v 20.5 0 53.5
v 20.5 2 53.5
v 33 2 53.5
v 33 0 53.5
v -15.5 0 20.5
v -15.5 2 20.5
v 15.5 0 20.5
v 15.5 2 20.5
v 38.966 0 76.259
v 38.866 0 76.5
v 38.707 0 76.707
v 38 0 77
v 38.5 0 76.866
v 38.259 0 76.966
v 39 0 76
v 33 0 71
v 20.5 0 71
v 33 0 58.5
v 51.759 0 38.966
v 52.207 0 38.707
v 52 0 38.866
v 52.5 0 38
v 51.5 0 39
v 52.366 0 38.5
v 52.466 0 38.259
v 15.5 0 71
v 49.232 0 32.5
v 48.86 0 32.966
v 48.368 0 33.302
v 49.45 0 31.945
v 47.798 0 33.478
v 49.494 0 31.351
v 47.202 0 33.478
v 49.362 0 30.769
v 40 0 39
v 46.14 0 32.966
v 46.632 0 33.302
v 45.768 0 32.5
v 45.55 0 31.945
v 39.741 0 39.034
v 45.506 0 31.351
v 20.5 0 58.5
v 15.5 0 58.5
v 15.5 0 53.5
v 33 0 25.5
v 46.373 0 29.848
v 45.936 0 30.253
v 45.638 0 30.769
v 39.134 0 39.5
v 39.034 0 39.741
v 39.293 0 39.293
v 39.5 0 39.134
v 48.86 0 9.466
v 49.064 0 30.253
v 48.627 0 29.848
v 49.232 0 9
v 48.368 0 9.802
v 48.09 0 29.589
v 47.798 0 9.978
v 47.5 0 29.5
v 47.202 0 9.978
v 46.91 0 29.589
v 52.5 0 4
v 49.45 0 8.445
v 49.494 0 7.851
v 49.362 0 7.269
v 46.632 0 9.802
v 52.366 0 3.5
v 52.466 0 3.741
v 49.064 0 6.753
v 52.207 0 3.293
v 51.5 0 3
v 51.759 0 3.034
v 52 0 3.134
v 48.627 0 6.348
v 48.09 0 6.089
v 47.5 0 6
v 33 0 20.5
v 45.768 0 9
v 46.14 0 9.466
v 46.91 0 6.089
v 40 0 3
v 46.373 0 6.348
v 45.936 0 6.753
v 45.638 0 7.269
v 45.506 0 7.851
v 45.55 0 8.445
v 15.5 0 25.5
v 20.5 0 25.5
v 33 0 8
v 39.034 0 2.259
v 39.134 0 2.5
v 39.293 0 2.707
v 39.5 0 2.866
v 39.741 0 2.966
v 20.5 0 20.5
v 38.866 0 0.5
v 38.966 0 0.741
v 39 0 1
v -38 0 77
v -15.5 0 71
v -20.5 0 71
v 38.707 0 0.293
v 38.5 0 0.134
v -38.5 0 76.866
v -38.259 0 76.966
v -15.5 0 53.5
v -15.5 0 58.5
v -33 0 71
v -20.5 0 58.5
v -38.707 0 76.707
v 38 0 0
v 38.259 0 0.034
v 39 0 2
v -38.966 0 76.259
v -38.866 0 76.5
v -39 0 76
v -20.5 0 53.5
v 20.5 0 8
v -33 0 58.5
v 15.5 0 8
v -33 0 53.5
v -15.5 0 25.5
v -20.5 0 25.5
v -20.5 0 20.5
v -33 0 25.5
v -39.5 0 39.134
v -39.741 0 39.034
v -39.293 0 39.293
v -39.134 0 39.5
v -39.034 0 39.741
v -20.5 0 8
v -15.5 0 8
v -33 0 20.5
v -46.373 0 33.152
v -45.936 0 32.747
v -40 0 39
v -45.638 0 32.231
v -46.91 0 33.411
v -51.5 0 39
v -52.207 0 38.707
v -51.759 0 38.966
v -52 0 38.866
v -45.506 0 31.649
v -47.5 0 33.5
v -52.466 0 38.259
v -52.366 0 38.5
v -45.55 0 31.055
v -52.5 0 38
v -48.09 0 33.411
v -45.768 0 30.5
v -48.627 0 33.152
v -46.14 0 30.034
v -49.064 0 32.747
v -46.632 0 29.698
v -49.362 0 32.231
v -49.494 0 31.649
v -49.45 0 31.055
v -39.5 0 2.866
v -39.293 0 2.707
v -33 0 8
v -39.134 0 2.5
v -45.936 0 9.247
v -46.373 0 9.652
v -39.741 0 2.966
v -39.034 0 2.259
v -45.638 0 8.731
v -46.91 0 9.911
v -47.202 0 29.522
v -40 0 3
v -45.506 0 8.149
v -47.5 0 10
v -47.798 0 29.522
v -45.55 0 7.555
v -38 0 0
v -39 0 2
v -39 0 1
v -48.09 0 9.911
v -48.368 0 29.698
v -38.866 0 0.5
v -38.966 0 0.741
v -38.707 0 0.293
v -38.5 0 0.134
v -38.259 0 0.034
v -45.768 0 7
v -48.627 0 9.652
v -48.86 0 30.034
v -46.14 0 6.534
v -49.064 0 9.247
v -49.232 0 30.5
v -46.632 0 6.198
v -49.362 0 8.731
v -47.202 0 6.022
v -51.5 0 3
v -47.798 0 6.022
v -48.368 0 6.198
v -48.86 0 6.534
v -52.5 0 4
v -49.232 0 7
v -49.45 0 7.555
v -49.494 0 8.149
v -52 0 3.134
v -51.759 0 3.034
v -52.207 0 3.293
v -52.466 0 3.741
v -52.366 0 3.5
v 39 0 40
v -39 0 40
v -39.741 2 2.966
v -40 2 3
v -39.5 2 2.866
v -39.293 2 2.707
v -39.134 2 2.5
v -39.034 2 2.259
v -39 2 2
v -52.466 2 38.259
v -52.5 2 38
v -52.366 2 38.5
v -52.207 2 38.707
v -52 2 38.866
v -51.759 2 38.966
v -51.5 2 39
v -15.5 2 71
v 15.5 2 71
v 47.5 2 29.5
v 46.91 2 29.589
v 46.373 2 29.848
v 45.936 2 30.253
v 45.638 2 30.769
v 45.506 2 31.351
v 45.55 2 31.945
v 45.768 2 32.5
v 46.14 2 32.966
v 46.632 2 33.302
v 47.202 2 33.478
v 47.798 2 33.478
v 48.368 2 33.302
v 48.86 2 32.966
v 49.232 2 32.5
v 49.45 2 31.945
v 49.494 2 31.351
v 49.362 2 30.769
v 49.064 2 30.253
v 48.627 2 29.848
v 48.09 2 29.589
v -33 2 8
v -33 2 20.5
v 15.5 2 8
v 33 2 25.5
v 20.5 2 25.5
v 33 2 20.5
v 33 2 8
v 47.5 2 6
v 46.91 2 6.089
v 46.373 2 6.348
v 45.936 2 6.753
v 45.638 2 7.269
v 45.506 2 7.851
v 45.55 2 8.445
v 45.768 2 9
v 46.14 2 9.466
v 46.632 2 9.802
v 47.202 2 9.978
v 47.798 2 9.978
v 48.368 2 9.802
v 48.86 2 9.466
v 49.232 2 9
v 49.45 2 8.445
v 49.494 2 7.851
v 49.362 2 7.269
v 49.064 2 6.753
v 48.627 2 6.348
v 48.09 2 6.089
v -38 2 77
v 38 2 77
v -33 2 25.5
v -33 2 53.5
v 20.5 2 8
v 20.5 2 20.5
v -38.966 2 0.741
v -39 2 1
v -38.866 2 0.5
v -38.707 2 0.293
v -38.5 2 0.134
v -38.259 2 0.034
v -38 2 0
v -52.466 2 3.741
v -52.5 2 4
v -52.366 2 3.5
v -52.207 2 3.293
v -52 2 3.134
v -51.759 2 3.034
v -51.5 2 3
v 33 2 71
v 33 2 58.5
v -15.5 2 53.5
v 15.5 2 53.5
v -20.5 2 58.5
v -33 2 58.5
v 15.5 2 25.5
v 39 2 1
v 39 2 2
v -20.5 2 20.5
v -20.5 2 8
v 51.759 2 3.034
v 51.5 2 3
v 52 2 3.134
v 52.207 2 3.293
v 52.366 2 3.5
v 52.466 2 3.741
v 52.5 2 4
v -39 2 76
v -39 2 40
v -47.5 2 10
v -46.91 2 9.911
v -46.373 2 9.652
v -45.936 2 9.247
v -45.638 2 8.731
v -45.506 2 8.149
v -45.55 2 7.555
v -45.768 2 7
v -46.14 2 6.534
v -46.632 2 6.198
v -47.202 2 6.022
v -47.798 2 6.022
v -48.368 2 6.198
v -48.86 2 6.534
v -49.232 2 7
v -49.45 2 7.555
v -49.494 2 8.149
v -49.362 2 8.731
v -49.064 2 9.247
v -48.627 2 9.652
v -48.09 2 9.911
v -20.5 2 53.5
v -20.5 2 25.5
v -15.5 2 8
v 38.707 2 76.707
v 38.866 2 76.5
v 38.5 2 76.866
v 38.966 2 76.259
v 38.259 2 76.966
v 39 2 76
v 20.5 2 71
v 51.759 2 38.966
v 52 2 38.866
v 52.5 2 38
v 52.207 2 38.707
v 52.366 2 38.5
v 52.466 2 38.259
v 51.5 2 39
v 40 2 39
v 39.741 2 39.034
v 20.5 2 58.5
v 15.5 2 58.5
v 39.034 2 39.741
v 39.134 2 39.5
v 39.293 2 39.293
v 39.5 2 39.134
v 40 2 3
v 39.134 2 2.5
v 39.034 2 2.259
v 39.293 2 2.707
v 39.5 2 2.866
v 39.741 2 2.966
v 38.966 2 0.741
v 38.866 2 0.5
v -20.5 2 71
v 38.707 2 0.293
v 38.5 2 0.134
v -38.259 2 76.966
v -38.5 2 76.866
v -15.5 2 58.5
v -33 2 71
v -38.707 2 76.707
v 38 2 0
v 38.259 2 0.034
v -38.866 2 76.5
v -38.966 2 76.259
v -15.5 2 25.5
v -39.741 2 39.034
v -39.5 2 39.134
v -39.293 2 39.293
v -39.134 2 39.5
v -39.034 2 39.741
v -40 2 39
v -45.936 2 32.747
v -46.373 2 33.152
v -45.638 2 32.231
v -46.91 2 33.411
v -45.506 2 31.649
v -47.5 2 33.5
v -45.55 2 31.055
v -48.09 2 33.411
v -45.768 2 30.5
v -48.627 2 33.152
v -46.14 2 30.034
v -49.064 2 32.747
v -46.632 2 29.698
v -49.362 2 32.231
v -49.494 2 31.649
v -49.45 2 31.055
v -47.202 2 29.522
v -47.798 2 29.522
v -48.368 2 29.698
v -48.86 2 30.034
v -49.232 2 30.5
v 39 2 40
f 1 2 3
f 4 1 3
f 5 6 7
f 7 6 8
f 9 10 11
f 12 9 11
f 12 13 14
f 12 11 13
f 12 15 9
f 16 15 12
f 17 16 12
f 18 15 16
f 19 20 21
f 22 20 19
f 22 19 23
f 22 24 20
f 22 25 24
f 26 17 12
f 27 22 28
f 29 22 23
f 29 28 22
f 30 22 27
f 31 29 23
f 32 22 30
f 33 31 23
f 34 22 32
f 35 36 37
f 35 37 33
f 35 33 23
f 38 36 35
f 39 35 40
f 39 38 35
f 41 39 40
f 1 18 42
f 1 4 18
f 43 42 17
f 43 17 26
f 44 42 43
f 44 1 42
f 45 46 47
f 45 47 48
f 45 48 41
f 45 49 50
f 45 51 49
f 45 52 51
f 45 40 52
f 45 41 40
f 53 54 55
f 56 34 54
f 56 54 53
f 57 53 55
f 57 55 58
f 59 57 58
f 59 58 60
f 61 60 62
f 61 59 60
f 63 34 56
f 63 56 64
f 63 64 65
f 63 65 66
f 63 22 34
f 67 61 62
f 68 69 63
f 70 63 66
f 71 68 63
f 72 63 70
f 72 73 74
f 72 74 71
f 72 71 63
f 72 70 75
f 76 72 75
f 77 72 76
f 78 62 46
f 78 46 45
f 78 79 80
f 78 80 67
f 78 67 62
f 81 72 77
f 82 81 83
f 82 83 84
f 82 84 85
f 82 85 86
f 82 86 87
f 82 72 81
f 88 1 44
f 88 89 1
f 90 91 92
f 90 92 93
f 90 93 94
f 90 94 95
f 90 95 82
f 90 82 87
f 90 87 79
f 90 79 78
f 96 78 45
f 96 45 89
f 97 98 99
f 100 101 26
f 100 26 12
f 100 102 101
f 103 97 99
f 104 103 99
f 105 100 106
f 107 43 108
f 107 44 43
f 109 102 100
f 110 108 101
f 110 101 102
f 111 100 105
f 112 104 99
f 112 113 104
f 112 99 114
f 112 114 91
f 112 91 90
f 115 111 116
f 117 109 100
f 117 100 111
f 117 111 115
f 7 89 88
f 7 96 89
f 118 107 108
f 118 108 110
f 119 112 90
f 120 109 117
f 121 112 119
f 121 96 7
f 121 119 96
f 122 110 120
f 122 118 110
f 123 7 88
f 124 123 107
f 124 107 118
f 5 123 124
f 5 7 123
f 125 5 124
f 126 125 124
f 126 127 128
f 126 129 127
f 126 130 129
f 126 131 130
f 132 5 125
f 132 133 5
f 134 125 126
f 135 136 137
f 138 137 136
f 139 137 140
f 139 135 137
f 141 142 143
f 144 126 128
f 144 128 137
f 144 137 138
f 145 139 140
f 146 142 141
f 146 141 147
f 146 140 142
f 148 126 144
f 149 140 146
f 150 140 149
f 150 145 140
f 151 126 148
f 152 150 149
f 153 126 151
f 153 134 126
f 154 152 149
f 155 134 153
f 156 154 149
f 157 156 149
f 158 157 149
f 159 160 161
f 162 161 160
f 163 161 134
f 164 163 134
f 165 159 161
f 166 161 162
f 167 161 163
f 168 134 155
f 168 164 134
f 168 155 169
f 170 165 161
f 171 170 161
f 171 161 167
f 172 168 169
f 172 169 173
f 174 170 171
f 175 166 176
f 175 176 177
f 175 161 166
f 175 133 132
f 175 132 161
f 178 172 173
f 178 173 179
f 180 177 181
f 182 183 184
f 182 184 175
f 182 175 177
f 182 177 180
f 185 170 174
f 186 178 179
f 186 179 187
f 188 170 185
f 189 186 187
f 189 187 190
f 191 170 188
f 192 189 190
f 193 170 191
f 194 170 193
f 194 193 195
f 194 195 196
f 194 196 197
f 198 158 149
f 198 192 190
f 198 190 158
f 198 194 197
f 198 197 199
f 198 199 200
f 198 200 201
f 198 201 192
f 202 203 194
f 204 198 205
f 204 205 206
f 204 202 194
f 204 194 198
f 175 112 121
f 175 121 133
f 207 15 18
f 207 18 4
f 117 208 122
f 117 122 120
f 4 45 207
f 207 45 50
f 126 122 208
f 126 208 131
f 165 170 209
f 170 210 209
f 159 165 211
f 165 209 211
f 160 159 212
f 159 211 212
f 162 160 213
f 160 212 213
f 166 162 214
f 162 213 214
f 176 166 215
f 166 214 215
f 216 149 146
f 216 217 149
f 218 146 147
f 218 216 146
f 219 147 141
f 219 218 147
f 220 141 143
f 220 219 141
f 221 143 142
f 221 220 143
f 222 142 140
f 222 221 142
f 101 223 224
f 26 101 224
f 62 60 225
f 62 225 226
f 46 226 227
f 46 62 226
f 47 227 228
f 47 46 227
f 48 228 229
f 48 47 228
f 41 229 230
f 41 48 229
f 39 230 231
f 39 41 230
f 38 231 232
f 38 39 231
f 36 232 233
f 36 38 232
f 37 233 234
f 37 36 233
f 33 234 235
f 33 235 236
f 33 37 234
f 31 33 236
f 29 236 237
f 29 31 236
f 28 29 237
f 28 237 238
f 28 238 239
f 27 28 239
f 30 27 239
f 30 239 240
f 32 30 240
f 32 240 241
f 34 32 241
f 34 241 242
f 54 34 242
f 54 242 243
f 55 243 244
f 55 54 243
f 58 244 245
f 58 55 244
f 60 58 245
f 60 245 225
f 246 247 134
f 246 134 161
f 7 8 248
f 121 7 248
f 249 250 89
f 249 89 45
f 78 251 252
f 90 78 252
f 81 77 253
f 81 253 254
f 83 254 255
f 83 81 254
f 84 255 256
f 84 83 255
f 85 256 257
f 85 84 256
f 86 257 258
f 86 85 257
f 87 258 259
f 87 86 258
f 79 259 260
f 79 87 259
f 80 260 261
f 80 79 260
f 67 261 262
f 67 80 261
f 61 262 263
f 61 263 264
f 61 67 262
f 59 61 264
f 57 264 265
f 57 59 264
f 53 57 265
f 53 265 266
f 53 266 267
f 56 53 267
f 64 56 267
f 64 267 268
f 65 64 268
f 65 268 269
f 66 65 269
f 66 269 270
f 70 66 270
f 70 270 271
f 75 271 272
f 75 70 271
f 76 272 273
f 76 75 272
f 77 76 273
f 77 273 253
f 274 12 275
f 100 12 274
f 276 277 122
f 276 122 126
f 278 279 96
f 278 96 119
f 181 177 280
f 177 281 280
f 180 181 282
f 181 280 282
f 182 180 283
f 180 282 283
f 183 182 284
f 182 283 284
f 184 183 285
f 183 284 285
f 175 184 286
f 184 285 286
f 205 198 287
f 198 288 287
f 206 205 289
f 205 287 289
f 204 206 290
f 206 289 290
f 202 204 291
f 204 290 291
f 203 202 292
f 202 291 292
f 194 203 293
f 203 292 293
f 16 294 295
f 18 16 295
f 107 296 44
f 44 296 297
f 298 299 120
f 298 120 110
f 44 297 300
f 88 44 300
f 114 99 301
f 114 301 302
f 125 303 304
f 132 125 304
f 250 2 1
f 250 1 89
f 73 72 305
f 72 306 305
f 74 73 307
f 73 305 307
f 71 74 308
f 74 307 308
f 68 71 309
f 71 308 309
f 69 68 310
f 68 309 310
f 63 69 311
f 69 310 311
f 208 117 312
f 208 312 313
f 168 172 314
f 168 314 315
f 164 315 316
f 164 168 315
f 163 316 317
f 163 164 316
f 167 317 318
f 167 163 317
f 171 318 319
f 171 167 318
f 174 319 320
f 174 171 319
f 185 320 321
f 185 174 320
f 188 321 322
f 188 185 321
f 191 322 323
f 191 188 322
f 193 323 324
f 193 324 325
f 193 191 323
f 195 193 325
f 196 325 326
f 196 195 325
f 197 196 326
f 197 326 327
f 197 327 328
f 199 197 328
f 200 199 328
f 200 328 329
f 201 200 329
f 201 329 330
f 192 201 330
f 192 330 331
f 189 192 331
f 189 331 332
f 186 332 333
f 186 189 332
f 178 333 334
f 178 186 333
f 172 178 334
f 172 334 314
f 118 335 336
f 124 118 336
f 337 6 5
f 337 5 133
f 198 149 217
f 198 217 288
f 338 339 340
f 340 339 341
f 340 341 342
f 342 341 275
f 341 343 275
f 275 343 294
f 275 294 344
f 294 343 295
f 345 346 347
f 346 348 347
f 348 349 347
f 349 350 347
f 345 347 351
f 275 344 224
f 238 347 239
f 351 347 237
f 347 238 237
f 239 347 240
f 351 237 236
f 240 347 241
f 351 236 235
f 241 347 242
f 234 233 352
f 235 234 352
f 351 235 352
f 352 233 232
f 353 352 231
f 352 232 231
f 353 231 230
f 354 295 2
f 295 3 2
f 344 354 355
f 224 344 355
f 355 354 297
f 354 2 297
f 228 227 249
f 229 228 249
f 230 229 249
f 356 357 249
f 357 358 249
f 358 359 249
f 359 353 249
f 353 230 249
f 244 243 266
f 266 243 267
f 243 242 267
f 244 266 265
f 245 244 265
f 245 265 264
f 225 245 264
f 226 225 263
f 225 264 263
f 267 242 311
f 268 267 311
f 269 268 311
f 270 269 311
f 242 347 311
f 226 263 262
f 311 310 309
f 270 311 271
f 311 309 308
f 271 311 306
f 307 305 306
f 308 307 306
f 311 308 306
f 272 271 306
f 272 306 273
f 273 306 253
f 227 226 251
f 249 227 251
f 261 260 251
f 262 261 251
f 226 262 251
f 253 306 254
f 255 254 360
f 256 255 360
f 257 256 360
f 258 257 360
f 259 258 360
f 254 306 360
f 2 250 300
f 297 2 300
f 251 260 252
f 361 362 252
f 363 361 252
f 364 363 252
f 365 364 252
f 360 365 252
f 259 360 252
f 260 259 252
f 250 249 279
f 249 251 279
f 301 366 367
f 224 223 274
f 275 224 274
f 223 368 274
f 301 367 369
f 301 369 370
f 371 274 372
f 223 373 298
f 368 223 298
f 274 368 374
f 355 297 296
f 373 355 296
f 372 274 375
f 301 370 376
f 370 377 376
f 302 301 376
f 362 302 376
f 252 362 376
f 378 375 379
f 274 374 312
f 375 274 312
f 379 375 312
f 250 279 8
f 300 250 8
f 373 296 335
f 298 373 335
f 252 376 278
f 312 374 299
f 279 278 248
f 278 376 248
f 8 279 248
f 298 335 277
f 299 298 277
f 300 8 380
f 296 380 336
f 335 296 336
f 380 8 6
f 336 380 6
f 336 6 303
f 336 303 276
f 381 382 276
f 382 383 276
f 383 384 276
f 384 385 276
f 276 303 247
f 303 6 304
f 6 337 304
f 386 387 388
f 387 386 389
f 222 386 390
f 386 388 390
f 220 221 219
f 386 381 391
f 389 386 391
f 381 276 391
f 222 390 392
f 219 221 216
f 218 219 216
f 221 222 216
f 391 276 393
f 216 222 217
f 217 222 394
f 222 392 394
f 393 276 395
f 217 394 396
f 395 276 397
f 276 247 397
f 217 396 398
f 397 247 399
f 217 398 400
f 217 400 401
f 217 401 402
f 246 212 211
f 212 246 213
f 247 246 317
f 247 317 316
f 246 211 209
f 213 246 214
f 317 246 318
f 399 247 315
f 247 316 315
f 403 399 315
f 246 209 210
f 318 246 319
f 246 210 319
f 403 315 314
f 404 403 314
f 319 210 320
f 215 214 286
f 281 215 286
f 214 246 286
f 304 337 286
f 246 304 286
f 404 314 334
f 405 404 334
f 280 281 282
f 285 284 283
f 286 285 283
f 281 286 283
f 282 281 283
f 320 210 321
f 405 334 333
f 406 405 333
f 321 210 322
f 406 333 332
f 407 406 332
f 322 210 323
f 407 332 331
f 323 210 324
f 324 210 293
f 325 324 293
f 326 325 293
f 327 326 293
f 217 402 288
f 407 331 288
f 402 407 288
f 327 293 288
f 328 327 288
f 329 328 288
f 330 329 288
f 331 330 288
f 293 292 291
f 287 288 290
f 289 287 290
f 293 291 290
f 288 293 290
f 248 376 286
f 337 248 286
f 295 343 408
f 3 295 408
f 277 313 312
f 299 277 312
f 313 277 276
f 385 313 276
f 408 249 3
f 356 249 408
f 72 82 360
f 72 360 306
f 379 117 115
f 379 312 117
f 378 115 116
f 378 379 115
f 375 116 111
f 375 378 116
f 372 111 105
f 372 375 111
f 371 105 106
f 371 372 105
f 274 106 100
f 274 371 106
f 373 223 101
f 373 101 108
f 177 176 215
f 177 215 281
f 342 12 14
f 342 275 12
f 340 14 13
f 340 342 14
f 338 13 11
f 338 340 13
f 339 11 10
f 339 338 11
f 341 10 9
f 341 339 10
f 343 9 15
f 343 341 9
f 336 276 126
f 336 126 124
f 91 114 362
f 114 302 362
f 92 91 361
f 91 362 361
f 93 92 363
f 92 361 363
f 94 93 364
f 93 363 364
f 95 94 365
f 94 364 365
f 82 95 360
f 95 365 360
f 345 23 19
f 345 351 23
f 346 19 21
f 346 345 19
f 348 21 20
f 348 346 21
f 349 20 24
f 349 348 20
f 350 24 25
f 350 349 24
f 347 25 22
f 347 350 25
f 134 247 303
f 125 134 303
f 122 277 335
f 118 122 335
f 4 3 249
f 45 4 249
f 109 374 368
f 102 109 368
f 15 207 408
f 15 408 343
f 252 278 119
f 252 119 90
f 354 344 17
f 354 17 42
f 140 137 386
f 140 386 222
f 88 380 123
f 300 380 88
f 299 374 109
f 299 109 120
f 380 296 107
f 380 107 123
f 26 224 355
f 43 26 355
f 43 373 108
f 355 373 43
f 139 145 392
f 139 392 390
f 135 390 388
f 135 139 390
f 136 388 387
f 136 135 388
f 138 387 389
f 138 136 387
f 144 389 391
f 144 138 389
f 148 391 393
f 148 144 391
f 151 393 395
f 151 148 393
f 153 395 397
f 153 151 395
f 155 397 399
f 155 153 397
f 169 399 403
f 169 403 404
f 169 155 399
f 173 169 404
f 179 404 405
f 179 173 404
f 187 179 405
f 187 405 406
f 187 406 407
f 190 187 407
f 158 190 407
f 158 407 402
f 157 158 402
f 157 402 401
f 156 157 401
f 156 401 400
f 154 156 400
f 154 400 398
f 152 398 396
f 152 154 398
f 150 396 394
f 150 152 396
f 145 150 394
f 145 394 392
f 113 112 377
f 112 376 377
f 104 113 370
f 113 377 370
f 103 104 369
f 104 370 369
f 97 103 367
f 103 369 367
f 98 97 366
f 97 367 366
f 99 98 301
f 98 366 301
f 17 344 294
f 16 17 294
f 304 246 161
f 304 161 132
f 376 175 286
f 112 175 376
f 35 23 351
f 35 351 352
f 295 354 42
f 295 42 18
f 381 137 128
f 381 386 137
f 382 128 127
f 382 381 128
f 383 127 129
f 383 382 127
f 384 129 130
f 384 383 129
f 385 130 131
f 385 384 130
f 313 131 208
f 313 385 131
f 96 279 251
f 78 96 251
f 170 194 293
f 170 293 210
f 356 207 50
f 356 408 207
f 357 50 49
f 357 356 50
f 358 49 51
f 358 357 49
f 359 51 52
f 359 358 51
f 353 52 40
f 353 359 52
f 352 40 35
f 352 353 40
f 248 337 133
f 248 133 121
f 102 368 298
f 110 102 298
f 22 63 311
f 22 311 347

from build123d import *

# Parameters (mm, degrees)
SKETCH_1_R          = 2
EXTRUDE_1_DEPTH     = 2
SKETCH_3_W          = 66
SKETCH_3_H          = 63
CUT_EXTRUDE_1_DEPTH = 94.21614667
FILLET_1_R          = 1
SKETCH_4_W          = 66
SKETCH_4_H          = 5
SKETCH_4_W_2        = 5
SKETCH_4_H_2        = 63
EXTRUDE_1_2_DEPTH   = 2


with BuildPart() as part:
    # 草图1 → Extrude 1 (new body)
    with BuildSketch(Plane(origin=(0, 0, 0), x_dir=(1, 0, 0), z_dir=(0, 1, 0))):
        Polygon((-52.5, -39), (-52.5, -3), (-39, -3), (-39, 0), (39, 0), (39, -3), (52.5, -3), (52.5, -39), (39, -39), (39, -77), (-39, -77), (-39, -39), align=None)
        with Locations(Location((-47.5, -8, 0), (0, 0, 270))):
            Circle(SKETCH_1_R, mode=Mode.SUBTRACT)
        with Locations(Location((-47.5, -31.5, 0), (0, 0, 270))):
            Circle(SKETCH_1_R, mode=Mode.SUBTRACT)
        with Locations(Location((47.5, -31.5, 0), (0, 0, 90))):
            Circle(SKETCH_1_R, mode=Mode.SUBTRACT)
        with Locations(Location((47.5, -8, 0), (0, 0, 90))):
            Circle(SKETCH_1_R, mode=Mode.SUBTRACT)
    extrude(amount=EXTRUDE_1_DEPTH)

    # 草图3 → 切除-拉伸1 (cut, through all)
    with BuildSketch(Plane(origin=(0, 2, 0), x_dir=(1, 0, 0), z_dir=(0, 1, 0))):
        with Locations((0, -39.5)):
            Rectangle(SKETCH_3_W, SKETCH_3_H)
    extrude(amount=-CUT_EXTRUDE_1_DEPTH, mode=Mode.SUBTRACT)

    # 圆角1
    fillet_1_edges = [part.edges().sort_by_distance(p)[0] for p in [
        (-52.5, 1, 39),
        (-52.5, 1, 3),
        (-39, 1, 3),
        (-39, 1, 0),
        (39, 1, 0),
        (39, 1, 3),
        (52.5, 1, 3),
        (52.5, 1, 39),
        (39, 1, 39),
        (39, 1, 77),
        (-39, 1, 77),
        (-39, 1, 39),
    ]]
    fillet(fillet_1_edges, radius=FILLET_1_R)

    # 草图4 → Extrude 1 2 (add)
    with BuildSketch(Plane(origin=(0, 2, 0), x_dir=(1, 0, 0), z_dir=(0, 1, 0))):
        with Locations((0, -23)):
            Rectangle(SKETCH_4_W, SKETCH_4_H)
        with Locations((0, -56)):
            Rectangle(SKETCH_4_W, SKETCH_4_H)
        with Locations((-18, -39.5)):
            Rectangle(SKETCH_4_W_2, SKETCH_4_H_2)
        with Locations((18, -39.5)):
            Rectangle(SKETCH_4_W_2, SKETCH_4_H_2)
    extrude(amount=-EXTRUDE_1_2_DEPTH)


solid = part.part
